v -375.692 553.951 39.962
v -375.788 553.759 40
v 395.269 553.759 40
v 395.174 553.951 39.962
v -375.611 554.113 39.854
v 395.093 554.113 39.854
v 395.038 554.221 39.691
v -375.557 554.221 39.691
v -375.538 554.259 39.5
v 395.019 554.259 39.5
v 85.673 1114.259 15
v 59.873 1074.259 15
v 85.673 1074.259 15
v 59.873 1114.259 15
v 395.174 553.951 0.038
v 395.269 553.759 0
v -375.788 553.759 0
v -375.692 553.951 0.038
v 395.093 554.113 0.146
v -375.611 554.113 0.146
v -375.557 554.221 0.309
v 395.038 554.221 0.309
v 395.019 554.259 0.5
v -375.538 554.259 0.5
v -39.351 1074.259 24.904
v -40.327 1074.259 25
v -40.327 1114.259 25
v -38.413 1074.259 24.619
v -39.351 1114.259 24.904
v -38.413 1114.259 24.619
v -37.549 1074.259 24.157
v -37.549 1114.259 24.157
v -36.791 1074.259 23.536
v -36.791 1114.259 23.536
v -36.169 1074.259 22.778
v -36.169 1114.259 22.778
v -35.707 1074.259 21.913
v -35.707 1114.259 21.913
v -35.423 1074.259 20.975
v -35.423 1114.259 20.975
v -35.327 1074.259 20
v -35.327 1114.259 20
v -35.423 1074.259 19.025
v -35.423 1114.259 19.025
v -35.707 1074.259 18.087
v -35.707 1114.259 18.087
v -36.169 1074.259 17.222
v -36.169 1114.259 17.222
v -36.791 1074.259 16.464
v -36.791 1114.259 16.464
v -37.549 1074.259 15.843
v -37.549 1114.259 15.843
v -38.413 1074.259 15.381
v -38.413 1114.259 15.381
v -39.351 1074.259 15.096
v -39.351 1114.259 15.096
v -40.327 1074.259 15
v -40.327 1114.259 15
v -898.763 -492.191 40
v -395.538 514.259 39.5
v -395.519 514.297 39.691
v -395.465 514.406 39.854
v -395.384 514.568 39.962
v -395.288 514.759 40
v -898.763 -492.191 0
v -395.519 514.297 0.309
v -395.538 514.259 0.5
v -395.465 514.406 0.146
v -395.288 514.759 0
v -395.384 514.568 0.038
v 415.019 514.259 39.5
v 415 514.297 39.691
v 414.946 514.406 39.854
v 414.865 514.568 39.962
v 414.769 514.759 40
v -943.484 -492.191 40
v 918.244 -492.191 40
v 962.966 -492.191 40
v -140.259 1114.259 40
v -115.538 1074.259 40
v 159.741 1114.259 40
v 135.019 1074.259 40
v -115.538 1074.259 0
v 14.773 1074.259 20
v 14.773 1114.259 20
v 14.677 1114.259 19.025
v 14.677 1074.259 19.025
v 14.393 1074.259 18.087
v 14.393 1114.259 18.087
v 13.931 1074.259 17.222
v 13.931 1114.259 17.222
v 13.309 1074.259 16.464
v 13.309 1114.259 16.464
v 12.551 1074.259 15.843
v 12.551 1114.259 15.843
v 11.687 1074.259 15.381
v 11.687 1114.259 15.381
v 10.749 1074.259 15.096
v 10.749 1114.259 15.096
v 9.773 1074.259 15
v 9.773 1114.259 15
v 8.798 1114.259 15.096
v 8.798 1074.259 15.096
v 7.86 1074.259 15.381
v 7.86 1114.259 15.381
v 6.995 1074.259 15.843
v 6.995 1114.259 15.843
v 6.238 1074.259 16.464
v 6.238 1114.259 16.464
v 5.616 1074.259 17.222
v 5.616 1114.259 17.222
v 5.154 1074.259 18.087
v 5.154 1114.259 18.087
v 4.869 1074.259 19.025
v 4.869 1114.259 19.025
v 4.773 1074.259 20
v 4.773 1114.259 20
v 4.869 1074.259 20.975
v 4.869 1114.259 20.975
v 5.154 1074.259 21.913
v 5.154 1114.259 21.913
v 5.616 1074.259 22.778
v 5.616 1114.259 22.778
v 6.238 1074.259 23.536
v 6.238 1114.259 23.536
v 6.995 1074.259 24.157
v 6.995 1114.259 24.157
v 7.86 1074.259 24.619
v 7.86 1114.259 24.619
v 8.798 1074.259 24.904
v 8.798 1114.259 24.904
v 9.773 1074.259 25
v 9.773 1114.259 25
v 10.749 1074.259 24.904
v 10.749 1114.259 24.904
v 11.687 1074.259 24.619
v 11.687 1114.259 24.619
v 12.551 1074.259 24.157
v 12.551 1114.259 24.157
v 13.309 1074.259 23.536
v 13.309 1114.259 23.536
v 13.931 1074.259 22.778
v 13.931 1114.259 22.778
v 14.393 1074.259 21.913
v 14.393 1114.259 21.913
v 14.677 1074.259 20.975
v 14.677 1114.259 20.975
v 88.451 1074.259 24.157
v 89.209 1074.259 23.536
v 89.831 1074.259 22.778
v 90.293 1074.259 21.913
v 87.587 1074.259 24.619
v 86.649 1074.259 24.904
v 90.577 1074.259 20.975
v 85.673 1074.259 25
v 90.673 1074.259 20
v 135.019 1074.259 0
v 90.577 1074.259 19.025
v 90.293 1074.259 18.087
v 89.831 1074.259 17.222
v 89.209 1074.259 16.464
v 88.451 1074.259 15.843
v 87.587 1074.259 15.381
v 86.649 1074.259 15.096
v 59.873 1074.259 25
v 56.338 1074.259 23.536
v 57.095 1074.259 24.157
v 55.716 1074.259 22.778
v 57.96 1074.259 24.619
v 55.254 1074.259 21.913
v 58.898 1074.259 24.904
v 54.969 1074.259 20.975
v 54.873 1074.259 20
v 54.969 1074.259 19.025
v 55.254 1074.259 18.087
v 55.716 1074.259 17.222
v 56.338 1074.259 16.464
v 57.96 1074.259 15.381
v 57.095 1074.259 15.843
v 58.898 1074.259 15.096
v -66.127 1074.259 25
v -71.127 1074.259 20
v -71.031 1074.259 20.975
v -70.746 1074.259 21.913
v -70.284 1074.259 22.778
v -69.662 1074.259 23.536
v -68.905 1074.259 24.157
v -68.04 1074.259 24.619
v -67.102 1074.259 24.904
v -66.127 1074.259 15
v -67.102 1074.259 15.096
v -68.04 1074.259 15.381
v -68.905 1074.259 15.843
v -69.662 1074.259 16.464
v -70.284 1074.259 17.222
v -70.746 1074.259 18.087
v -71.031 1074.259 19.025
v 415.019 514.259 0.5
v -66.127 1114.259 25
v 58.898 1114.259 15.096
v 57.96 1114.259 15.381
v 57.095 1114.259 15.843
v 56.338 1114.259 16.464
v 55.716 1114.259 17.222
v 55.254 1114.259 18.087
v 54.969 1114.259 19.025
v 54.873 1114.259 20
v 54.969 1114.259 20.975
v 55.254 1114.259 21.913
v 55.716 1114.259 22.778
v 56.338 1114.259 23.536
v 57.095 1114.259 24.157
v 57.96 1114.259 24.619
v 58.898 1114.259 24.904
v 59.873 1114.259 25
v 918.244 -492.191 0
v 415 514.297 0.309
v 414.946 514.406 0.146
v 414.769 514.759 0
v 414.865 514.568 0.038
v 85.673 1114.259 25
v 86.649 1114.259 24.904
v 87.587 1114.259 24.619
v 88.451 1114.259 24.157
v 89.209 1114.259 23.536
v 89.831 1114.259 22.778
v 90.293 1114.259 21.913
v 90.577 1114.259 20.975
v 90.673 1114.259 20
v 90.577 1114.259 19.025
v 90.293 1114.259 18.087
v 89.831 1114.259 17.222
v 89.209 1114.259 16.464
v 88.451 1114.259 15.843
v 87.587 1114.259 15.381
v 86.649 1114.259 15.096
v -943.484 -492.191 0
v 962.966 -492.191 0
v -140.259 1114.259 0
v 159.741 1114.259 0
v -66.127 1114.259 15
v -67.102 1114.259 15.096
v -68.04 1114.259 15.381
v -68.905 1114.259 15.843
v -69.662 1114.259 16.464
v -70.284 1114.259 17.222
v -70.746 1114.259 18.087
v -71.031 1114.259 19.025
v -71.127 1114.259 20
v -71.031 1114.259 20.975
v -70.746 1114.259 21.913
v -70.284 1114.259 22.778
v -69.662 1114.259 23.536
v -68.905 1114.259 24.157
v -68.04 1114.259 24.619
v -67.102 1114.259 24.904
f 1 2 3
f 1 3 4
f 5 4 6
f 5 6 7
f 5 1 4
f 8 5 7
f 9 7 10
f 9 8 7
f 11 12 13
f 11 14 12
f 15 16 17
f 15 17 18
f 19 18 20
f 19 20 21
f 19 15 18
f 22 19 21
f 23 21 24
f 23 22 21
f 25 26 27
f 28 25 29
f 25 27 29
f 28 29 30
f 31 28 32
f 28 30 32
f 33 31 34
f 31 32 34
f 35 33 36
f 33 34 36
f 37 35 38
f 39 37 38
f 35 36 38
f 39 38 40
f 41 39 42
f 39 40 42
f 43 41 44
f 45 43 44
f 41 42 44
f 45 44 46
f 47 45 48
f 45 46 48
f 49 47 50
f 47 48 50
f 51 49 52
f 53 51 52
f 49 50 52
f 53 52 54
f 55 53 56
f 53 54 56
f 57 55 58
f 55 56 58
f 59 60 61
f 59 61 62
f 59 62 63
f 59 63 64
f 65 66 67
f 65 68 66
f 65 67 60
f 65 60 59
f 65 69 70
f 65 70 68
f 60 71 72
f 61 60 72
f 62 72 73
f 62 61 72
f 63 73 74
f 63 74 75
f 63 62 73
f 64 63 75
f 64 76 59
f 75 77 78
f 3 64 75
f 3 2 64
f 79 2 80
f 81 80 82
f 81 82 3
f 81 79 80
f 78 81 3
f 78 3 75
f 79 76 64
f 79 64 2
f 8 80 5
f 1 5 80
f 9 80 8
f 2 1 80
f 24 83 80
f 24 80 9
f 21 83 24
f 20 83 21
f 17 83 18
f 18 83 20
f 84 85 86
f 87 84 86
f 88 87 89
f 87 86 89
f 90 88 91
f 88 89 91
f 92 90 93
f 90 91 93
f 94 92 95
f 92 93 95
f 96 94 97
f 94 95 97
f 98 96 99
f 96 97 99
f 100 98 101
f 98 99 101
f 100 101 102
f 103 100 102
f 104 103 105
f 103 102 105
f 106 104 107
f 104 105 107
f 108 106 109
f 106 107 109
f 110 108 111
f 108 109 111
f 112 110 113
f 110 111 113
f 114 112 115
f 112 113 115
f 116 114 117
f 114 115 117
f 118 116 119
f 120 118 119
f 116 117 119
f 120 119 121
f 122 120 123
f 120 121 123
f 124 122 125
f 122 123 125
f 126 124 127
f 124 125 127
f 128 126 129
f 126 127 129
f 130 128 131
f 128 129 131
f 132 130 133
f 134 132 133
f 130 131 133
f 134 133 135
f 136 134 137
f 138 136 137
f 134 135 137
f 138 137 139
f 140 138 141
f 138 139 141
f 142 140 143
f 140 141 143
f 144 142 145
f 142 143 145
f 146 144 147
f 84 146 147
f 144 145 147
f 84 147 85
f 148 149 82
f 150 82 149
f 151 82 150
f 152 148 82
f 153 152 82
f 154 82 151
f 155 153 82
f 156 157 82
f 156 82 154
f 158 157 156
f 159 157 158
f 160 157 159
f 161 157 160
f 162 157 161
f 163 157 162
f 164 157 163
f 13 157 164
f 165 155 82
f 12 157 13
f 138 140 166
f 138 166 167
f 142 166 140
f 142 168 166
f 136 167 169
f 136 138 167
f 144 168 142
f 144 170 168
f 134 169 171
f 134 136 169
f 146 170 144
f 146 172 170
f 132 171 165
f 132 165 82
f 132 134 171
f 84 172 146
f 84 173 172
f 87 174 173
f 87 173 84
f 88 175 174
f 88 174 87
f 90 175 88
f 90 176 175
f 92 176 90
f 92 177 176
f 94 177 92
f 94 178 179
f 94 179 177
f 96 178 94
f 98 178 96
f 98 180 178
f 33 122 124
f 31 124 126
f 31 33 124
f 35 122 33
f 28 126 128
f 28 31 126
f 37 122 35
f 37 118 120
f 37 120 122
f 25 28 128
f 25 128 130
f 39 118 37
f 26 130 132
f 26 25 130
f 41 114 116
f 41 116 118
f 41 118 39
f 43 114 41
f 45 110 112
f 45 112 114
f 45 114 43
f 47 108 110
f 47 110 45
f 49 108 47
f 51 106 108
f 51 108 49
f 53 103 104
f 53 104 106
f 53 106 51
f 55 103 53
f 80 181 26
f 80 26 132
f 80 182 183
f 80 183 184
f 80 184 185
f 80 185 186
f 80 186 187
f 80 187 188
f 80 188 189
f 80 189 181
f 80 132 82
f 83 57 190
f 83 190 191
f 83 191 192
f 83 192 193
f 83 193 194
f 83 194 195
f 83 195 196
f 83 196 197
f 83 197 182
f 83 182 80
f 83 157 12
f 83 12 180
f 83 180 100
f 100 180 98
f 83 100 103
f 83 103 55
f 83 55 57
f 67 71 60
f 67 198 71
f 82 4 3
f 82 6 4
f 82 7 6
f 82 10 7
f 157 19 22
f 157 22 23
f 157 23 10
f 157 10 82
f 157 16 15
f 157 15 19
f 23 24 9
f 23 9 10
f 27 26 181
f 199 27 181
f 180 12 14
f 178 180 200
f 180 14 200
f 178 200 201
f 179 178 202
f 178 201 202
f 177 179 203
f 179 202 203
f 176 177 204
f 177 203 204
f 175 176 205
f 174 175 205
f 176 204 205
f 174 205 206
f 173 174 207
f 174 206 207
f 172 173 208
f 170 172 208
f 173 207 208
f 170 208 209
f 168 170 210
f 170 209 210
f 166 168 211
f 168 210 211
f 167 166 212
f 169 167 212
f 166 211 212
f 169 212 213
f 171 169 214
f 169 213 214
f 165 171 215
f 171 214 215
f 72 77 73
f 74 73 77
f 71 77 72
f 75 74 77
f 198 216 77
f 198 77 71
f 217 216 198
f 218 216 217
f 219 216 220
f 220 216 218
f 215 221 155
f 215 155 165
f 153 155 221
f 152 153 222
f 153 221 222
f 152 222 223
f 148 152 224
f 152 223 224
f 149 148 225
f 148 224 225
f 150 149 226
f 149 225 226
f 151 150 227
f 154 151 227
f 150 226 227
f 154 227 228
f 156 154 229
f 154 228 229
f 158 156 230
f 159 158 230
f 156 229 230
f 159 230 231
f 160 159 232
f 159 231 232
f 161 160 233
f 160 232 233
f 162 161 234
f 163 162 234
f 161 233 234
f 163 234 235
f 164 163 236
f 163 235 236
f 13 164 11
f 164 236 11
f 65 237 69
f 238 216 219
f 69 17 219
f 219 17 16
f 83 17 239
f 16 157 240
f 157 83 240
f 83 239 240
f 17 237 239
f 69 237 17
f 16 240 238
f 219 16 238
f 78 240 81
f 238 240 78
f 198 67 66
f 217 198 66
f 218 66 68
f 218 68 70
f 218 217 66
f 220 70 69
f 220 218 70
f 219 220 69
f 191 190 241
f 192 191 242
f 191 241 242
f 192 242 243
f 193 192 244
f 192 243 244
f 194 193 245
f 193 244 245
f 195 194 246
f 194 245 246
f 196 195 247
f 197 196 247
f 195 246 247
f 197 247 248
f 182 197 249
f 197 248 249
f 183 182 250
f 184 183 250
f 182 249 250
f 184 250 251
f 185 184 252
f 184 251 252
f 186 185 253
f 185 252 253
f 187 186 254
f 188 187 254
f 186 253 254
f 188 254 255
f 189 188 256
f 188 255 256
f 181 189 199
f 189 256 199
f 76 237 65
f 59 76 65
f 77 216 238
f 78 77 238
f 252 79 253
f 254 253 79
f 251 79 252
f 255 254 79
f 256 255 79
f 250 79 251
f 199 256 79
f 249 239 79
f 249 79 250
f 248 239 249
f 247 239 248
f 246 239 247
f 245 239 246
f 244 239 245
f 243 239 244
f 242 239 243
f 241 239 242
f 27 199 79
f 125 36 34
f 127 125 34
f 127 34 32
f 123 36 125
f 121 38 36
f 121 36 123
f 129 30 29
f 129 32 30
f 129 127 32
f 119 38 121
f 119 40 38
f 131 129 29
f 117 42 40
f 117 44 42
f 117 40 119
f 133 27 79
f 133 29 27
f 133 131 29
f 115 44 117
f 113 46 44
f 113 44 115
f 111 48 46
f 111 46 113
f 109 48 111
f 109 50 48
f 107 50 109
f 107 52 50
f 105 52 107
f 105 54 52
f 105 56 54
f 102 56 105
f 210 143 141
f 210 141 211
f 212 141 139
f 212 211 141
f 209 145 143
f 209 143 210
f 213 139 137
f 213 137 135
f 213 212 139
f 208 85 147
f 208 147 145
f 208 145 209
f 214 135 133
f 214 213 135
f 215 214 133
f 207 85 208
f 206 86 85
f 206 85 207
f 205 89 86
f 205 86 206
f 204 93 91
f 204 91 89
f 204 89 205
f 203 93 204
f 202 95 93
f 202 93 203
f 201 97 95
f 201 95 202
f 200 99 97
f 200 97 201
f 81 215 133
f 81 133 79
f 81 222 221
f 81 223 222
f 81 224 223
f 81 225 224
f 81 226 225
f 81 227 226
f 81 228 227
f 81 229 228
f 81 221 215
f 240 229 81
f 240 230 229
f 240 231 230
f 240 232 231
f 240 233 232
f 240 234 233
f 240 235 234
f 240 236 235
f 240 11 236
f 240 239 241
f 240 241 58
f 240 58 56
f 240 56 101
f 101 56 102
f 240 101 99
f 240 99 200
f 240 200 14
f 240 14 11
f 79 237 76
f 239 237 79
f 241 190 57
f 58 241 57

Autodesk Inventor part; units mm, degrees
ref_plane "YZ Plane" through (0, 0, 0) normal (1, 0, 0) x (0, 1, 0)
ref_plane "XZ Plane" through (0, 0, 0) normal (0, 1, 0) x (-1, 0, 0)
ref_plane "XY Plane" through (0, 0, 0) normal (0, 0, 1) x (1, 0, 0)
sketch "Sketch1" plane through (0, 0, 0) normal (0, 0, 1) x (1, 0, 0)
  line L0 (9.7407, 1114.2593) -> (159.7407, 1114.2593)
  line L1 (9.7407, 1114.2593) -> (-140.2593, 1114.2593)
  line L2 (-943.4843, -492.1907) -> (-140.2593, 1114.2593)
  line L3 (159.7407, 1114.2593) -> (962.9657, -492.1907)
  line L4 (918.2444, -492.1907) -> (135.0194, 1074.2593)
  line L5 (135.0194, 1074.2593) -> (9.7407, 1074.2593)
  line L6 (9.7407, 1074.2593) -> (-115.5379, 1074.2593)
  line L7 (-115.5379, 1074.2593) -> (-898.7629, -492.1907)
  line L8 (9.7407, 554.2593) -> (395.0194, 554.2593)
  line L9 (9.7407, 554.2593) -> (-375.5379, 554.2593)
  line L10 (415.0194, 514.2593) -> (9.7407, 514.2593)
  line L11 (9.7407, 514.2593) -> (-395.5379, 514.2593)
  line L12 (-635.5379, 34.2593) -> (-680.2593, 34.2593)
  line L13 (9.7407, 34.2593) -> (9.7407, -477.7407)
  line L14 (-785.5379, -265.7407) -> (-830.2593, -265.7407)
  line L15 (-830.2593, -265.7407) -> (-785.5379, -265.7407)
  line L16 (911.0194, -477.7407) -> (955.7407, -477.7407)
  line L17 (955.7407, -477.7407) -> (911.0194, -477.7407)
  line L18 (-891.5379, -477.7407) -> (-936.2593, -477.7407)
  line L19 (918.2444, -492.1907) -> (962.9657, -492.1907)
  line L20 (-943.4843, -492.1907) -> (-898.7629, -492.1907)
  point P0 (0, 0)
  point P1 (655.0194, 34.2593)
  point P2 (699.7407, 34.2593)
  point P3 (-670.2593, 54.2593)
  dimension "d4" = 40
  dimension "d5" = 40
  dimension "d12" = 40
  dimension "d23" = 512
extrude "Extrusion1" add sketch "Sketch1" along normal blind 40 contours L0 L3 L16 L4 L5 L6 L7 L12 L2 L1
fillet "Fillet1" radius 0.5 7 edges at (-245.5379, 814.2593, 40) (-515.5379, 274.2593, 40) (72.3801, 1074.2593, 40) (265.0194, 814.2593, 40) (557.7407, 318.2593, 40) (-65.2593, 1114.2593, 40) (-410.2593, 574.2593, 40)
fillet "Fillet2" radius 0.5 7 edges at (-410.2593, 574.2593, 0) (-245.5379, 814.2593, 0) (-515.5379, 274.2593, 0) (72.3801, 1074.2593, 0) (84.7407, 1114.2593, 0) (557.7407, 318.2593, 0) (265.0194, 814.2593, 0)
extrude "Extrusion2" add sketch "Sketch1" along normal blind 40 contours L10 L11 L7 L9 L8 L4
fillet "Fillet3" radius 0.5 3 edges at (9.7407, 554.2593, 0) (212.3801, 514.2593, 0) (212.3801, 514.2593, 40)
fillet "Fillet4" radius 0.5 1 edges at (9.7407, 554.2593, 40)
sketch "Sketch2" plane through (-140.2593, 1114.2593, 39.5) normal (0, 1, 0) x (1, 0, 0)
  line L0 (298.84, 0.606) -> (0.309, 39.5)
  line L1 (299.691, 39.5) -> (0, 0)
  circle A0 centre (150.8669, 19.8846) radius 2.5
  point P0 (140.2593, 39.5)
  dimension "d17" = 5
extrude "Extrusion3" cut sketch "Sketch2" against normal blind 50
sketch "Sketch3" plane through (-140.2593, 1114.2593, 39.5) normal (0, 1, 0) x (1, 0, 0)
  point P0 (140.2593, 39.5)
sketch "Sketch4" plane through (-140.2593, 1114.2593, 39.5) normal (0, 1, 0) x (1, 0, 0)
  line L0 (226.7669, 24.5) -> (200.9669, 24.5) projected
  line L1 (226.7669, 24.5) -> (200.9669, 24.5) projected
  line L2 (200.9669, 14.5) -> (226.7669, 14.5) projected
  arc A0 (226.7669, 14.5) -> (226.7669, 24.5) centre (226.7669, 19.5) ccw projected
  arc A1 (200.9669, 24.5) -> (200.9669, 14.5) centre (200.9669, 19.5) ccw projected
  arc A2 (100.7669, 14.5) -> (100.7669, 24.5) centre (100.7669, 19.5) ccw projected
  line L3 (100.7669, 24.5) -> (74.9669, 24.5) projected
  line L4 (100.7669, 14.5) -> (74.9669, 14.5) projected
  arc A3 (74.9669, 24.5) -> (74.9669, 14.5) centre (74.9669, 19.5) ccw projected
  point P0 (140.2593, 39.5)
extrude "Extrusion4" cut sketch "Sketch4" against normal blind 50
extrude "Extrusion5" add sketch "Sketch1" along normal blind 40 contours L0 L3 L16 L4 L5 L6 L7 L12 L2 L1
extrude "Extrusion6" add sketch "Sketch1" along normal blind 40 contours L12 L7 L14 L2
extrude "Extrusion7" add sketch "Sketch1" along normal blind 40 contours L14 L7 L18 L2
extrude "Extrusion8" add sketch "Sketch1" along normal blind 40 contours L18 L7 L20 L2
extrude "Extrusion9" add sketch "Sketch1" along normal blind 40 contours L3 L19 L4 L16
sketch "Sketch5" plane through (-140.2593, 1114.2593, 0) normal (0, 1, 0) x (1, 0, 0)
  line L0 (535.5286, 0) -> (-235.5286, 0) projected
  line L1 (0.065, 0) -> (300, -40)
  line L2 (300, -40) -> (300, 0)
  line L3 (300, 0) -> (300, -40) projected
  line L4 (300, 0) -> (0.065, -40)
  circle A0 centre (150.0325, -20) radius 5
  point P0 (140.2593, 0)
  dimension "d38" = 10
extrude "Extrusion10" cut sketch "Sketch5" against normal blind 40 contours A0 L1 L4 | L4 L1 A0 | L1 L4 A0 | A0 L4 L1
sketch "Sketch6" plane through (-140.2593, 1114.2593, 0) normal (0, 1, 0) x (1, 0, 0)
  line L0 (225.9325, -25) -> (200.1325, -25) projected
  arc A0 (225.9325, -25) -> (225.9325, -15) centre (225.9325, -20) ccw projected
  line L1 (200.1325, -15) -> (225.9325, -15) projected
  arc A1 (200.1325, -15) -> (200.1325, -25) centre (200.1325, -20) ccw projected
  arc A2 (99.9325, -25) -> (99.9325, -15) centre (99.9325, -20) ccw projected
  line L2 (99.9325, -25) -> (74.1325, -25) projected
  arc A3 (74.1325, -15) -> (74.1325, -25) centre (74.1325, -20) ccw projected
  line L3 (74.1325, -15) -> (99.9325, -15) projected
  point P0 (140.2593, 0)
extrude "Extrusion11" cut sketch "Sketch6" against normal blind 50
properties part number "CAVALETE_SUPERIOR" material "SAE 1010/1020"
